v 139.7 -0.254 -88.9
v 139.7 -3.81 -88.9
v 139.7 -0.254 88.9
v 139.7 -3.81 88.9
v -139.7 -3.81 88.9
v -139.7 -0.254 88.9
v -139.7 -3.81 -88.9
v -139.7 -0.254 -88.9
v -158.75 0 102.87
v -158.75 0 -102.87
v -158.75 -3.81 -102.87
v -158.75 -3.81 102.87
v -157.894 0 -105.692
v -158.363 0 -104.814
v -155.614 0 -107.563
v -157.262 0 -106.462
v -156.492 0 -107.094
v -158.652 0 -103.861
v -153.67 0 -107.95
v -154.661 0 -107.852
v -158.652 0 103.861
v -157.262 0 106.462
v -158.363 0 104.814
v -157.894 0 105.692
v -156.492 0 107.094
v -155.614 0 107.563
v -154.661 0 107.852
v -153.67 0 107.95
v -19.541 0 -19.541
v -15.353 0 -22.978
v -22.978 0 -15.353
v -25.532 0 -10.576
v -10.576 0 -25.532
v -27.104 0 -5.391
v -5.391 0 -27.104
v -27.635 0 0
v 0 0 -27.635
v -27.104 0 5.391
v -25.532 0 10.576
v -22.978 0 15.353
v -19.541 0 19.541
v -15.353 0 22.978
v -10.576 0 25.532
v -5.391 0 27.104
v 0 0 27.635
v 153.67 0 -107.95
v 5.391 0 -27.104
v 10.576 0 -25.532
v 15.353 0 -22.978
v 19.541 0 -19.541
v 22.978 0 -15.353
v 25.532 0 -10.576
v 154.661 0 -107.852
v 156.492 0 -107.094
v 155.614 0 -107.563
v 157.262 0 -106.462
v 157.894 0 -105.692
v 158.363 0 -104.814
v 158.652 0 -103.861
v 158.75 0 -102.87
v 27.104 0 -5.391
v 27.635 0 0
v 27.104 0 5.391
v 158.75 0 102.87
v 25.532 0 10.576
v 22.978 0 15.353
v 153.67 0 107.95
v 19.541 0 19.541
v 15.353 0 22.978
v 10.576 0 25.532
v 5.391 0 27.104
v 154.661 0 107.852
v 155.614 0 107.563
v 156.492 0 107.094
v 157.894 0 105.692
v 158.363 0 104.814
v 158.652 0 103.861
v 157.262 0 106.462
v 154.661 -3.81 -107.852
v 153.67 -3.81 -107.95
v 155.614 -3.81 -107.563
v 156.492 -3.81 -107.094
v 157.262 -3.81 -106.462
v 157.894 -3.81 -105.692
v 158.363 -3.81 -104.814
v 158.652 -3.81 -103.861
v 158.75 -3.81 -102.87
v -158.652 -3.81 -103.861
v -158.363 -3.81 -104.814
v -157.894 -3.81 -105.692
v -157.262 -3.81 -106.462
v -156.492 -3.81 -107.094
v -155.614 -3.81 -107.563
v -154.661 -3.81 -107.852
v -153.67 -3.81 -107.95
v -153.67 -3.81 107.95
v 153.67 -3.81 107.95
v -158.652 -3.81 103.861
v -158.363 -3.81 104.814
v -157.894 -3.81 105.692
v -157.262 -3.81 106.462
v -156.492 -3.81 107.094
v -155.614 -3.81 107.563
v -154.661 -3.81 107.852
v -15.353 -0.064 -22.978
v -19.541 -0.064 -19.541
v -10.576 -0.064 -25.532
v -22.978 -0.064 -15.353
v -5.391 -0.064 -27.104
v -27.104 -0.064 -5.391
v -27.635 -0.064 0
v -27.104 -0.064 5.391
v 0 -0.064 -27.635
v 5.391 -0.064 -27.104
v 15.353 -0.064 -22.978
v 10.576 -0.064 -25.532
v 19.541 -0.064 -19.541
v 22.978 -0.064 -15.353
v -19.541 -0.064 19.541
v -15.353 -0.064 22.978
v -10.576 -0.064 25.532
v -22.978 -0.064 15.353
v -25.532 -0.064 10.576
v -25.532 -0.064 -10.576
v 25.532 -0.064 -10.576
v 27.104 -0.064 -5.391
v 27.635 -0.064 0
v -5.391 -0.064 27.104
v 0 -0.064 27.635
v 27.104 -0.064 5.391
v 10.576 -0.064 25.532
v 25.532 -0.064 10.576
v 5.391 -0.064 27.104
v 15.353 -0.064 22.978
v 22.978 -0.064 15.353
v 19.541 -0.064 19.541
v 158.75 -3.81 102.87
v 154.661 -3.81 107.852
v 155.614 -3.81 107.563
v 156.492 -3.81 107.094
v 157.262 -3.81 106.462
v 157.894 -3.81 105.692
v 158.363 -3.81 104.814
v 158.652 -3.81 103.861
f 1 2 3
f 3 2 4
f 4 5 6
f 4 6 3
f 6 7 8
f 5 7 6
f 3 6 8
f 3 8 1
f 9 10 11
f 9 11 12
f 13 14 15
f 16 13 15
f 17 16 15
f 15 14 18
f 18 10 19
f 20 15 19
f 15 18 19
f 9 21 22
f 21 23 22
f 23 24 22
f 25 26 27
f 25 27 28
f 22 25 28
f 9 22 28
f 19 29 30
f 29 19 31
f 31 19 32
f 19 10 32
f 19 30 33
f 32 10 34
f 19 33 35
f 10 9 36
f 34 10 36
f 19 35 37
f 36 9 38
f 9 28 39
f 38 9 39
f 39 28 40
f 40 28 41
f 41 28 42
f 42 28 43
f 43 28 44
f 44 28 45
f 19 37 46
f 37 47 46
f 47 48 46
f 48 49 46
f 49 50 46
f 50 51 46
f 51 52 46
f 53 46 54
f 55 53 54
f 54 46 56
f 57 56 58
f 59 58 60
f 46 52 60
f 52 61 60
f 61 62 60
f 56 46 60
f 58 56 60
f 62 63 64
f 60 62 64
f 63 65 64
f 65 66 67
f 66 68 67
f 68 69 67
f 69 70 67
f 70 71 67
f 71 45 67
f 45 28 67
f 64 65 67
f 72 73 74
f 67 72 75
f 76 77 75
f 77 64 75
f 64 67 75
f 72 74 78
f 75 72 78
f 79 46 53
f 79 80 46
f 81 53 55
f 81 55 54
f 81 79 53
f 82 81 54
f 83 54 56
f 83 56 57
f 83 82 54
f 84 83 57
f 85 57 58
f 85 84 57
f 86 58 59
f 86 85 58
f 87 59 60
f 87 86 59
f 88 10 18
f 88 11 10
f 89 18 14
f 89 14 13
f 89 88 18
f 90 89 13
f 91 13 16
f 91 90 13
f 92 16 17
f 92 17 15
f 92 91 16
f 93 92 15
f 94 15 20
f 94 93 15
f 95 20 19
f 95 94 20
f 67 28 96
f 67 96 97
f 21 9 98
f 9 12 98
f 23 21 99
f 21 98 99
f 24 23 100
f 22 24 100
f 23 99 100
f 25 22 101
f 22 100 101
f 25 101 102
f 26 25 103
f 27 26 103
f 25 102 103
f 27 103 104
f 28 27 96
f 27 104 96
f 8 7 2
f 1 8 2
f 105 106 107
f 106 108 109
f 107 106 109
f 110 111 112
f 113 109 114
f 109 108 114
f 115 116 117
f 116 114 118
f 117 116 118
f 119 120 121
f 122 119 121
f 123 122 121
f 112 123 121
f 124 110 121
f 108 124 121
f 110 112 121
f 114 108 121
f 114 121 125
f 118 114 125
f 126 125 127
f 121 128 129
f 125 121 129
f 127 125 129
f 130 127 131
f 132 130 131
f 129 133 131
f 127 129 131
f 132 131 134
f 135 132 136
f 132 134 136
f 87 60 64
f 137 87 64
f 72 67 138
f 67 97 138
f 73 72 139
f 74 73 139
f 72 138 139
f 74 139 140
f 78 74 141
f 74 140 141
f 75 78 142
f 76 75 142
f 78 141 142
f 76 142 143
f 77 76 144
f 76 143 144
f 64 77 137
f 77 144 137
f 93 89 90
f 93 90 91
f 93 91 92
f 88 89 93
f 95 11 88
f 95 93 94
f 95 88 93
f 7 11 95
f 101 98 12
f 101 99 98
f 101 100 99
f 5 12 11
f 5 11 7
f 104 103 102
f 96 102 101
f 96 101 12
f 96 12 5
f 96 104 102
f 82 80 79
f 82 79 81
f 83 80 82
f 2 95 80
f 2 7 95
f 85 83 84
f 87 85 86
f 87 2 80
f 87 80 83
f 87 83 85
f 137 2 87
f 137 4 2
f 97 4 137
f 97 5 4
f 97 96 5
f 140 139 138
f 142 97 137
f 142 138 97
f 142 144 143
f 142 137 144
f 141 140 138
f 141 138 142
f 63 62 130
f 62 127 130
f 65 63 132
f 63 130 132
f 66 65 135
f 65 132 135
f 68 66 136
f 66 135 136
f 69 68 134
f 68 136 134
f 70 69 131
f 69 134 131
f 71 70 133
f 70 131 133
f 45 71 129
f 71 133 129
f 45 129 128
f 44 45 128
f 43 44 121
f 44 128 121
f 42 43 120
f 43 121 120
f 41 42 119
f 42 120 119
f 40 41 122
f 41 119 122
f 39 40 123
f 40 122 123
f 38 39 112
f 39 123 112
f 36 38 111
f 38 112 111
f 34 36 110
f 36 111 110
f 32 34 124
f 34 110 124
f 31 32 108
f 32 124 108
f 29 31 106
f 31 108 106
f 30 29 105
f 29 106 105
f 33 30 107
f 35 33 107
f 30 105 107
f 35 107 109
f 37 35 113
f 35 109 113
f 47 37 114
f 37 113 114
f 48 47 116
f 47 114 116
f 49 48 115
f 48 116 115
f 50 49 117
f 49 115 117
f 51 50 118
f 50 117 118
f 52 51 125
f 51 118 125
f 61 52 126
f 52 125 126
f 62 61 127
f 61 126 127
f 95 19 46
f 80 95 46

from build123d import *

# Parameters (mm, degrees)
F0_W     = 317.5
F0_H     = 215.9
F1_DEPTH = 3.81
F2_R     = 5.08
F3_R     = 5.08
F4_W     = 279.4
F4_H     = 177.8
F5_DEPTH = 25.4
F6_W     = 279.4
F6_H     = 177.8
F7_DEPTH = 0.254
F8_R     = 27.6352
F9_DEPTH = 0.0635


with BuildPart() as f1:
    # F0 (on Front) → F1 (new body)
    with BuildSketch(Plane.XZ):
        Rectangle(F0_W, F0_H)
    extrude(amount=F1_DEPTH)

    # F2
    f2_edges = [f1.edges().sort_by_distance(p)[0] for p in [
        (-158.75, -1.905, -107.95),
    ]]
    fillet(f2_edges, radius=F2_R)

    # F3
    f3_edges = [f1.edges().sort_by_distance(p)[0] for p in [
        (-158.75, -1.905, 107.95),
        (158.75, -1.905, 107.95),
        (158.75, -1.905, -107.95),
    ]]
    fillet(f3_edges, radius=F3_R)

    # F4 (on face) → F5 (cut)
    with BuildSketch(Plane.XZ.offset(3.81)):
        Rectangle(F4_W, F4_H)
    extrude(amount=-F5_DEPTH, mode=Mode.SUBTRACT)

    # F6 (on face) → F7 (join)
    with BuildSketch(Plane.XZ):
        Rectangle(F6_W, F6_H)
    extrude(amount=F7_DEPTH)

    # F8 (on face) → F9 (cut, symmetric)
    with BuildSketch(Plane.XZ):
        Circle(F8_R)
    extrude(amount=F9_DEPTH, both=True, mode=Mode.SUBTRACT)


solid = f1.part
